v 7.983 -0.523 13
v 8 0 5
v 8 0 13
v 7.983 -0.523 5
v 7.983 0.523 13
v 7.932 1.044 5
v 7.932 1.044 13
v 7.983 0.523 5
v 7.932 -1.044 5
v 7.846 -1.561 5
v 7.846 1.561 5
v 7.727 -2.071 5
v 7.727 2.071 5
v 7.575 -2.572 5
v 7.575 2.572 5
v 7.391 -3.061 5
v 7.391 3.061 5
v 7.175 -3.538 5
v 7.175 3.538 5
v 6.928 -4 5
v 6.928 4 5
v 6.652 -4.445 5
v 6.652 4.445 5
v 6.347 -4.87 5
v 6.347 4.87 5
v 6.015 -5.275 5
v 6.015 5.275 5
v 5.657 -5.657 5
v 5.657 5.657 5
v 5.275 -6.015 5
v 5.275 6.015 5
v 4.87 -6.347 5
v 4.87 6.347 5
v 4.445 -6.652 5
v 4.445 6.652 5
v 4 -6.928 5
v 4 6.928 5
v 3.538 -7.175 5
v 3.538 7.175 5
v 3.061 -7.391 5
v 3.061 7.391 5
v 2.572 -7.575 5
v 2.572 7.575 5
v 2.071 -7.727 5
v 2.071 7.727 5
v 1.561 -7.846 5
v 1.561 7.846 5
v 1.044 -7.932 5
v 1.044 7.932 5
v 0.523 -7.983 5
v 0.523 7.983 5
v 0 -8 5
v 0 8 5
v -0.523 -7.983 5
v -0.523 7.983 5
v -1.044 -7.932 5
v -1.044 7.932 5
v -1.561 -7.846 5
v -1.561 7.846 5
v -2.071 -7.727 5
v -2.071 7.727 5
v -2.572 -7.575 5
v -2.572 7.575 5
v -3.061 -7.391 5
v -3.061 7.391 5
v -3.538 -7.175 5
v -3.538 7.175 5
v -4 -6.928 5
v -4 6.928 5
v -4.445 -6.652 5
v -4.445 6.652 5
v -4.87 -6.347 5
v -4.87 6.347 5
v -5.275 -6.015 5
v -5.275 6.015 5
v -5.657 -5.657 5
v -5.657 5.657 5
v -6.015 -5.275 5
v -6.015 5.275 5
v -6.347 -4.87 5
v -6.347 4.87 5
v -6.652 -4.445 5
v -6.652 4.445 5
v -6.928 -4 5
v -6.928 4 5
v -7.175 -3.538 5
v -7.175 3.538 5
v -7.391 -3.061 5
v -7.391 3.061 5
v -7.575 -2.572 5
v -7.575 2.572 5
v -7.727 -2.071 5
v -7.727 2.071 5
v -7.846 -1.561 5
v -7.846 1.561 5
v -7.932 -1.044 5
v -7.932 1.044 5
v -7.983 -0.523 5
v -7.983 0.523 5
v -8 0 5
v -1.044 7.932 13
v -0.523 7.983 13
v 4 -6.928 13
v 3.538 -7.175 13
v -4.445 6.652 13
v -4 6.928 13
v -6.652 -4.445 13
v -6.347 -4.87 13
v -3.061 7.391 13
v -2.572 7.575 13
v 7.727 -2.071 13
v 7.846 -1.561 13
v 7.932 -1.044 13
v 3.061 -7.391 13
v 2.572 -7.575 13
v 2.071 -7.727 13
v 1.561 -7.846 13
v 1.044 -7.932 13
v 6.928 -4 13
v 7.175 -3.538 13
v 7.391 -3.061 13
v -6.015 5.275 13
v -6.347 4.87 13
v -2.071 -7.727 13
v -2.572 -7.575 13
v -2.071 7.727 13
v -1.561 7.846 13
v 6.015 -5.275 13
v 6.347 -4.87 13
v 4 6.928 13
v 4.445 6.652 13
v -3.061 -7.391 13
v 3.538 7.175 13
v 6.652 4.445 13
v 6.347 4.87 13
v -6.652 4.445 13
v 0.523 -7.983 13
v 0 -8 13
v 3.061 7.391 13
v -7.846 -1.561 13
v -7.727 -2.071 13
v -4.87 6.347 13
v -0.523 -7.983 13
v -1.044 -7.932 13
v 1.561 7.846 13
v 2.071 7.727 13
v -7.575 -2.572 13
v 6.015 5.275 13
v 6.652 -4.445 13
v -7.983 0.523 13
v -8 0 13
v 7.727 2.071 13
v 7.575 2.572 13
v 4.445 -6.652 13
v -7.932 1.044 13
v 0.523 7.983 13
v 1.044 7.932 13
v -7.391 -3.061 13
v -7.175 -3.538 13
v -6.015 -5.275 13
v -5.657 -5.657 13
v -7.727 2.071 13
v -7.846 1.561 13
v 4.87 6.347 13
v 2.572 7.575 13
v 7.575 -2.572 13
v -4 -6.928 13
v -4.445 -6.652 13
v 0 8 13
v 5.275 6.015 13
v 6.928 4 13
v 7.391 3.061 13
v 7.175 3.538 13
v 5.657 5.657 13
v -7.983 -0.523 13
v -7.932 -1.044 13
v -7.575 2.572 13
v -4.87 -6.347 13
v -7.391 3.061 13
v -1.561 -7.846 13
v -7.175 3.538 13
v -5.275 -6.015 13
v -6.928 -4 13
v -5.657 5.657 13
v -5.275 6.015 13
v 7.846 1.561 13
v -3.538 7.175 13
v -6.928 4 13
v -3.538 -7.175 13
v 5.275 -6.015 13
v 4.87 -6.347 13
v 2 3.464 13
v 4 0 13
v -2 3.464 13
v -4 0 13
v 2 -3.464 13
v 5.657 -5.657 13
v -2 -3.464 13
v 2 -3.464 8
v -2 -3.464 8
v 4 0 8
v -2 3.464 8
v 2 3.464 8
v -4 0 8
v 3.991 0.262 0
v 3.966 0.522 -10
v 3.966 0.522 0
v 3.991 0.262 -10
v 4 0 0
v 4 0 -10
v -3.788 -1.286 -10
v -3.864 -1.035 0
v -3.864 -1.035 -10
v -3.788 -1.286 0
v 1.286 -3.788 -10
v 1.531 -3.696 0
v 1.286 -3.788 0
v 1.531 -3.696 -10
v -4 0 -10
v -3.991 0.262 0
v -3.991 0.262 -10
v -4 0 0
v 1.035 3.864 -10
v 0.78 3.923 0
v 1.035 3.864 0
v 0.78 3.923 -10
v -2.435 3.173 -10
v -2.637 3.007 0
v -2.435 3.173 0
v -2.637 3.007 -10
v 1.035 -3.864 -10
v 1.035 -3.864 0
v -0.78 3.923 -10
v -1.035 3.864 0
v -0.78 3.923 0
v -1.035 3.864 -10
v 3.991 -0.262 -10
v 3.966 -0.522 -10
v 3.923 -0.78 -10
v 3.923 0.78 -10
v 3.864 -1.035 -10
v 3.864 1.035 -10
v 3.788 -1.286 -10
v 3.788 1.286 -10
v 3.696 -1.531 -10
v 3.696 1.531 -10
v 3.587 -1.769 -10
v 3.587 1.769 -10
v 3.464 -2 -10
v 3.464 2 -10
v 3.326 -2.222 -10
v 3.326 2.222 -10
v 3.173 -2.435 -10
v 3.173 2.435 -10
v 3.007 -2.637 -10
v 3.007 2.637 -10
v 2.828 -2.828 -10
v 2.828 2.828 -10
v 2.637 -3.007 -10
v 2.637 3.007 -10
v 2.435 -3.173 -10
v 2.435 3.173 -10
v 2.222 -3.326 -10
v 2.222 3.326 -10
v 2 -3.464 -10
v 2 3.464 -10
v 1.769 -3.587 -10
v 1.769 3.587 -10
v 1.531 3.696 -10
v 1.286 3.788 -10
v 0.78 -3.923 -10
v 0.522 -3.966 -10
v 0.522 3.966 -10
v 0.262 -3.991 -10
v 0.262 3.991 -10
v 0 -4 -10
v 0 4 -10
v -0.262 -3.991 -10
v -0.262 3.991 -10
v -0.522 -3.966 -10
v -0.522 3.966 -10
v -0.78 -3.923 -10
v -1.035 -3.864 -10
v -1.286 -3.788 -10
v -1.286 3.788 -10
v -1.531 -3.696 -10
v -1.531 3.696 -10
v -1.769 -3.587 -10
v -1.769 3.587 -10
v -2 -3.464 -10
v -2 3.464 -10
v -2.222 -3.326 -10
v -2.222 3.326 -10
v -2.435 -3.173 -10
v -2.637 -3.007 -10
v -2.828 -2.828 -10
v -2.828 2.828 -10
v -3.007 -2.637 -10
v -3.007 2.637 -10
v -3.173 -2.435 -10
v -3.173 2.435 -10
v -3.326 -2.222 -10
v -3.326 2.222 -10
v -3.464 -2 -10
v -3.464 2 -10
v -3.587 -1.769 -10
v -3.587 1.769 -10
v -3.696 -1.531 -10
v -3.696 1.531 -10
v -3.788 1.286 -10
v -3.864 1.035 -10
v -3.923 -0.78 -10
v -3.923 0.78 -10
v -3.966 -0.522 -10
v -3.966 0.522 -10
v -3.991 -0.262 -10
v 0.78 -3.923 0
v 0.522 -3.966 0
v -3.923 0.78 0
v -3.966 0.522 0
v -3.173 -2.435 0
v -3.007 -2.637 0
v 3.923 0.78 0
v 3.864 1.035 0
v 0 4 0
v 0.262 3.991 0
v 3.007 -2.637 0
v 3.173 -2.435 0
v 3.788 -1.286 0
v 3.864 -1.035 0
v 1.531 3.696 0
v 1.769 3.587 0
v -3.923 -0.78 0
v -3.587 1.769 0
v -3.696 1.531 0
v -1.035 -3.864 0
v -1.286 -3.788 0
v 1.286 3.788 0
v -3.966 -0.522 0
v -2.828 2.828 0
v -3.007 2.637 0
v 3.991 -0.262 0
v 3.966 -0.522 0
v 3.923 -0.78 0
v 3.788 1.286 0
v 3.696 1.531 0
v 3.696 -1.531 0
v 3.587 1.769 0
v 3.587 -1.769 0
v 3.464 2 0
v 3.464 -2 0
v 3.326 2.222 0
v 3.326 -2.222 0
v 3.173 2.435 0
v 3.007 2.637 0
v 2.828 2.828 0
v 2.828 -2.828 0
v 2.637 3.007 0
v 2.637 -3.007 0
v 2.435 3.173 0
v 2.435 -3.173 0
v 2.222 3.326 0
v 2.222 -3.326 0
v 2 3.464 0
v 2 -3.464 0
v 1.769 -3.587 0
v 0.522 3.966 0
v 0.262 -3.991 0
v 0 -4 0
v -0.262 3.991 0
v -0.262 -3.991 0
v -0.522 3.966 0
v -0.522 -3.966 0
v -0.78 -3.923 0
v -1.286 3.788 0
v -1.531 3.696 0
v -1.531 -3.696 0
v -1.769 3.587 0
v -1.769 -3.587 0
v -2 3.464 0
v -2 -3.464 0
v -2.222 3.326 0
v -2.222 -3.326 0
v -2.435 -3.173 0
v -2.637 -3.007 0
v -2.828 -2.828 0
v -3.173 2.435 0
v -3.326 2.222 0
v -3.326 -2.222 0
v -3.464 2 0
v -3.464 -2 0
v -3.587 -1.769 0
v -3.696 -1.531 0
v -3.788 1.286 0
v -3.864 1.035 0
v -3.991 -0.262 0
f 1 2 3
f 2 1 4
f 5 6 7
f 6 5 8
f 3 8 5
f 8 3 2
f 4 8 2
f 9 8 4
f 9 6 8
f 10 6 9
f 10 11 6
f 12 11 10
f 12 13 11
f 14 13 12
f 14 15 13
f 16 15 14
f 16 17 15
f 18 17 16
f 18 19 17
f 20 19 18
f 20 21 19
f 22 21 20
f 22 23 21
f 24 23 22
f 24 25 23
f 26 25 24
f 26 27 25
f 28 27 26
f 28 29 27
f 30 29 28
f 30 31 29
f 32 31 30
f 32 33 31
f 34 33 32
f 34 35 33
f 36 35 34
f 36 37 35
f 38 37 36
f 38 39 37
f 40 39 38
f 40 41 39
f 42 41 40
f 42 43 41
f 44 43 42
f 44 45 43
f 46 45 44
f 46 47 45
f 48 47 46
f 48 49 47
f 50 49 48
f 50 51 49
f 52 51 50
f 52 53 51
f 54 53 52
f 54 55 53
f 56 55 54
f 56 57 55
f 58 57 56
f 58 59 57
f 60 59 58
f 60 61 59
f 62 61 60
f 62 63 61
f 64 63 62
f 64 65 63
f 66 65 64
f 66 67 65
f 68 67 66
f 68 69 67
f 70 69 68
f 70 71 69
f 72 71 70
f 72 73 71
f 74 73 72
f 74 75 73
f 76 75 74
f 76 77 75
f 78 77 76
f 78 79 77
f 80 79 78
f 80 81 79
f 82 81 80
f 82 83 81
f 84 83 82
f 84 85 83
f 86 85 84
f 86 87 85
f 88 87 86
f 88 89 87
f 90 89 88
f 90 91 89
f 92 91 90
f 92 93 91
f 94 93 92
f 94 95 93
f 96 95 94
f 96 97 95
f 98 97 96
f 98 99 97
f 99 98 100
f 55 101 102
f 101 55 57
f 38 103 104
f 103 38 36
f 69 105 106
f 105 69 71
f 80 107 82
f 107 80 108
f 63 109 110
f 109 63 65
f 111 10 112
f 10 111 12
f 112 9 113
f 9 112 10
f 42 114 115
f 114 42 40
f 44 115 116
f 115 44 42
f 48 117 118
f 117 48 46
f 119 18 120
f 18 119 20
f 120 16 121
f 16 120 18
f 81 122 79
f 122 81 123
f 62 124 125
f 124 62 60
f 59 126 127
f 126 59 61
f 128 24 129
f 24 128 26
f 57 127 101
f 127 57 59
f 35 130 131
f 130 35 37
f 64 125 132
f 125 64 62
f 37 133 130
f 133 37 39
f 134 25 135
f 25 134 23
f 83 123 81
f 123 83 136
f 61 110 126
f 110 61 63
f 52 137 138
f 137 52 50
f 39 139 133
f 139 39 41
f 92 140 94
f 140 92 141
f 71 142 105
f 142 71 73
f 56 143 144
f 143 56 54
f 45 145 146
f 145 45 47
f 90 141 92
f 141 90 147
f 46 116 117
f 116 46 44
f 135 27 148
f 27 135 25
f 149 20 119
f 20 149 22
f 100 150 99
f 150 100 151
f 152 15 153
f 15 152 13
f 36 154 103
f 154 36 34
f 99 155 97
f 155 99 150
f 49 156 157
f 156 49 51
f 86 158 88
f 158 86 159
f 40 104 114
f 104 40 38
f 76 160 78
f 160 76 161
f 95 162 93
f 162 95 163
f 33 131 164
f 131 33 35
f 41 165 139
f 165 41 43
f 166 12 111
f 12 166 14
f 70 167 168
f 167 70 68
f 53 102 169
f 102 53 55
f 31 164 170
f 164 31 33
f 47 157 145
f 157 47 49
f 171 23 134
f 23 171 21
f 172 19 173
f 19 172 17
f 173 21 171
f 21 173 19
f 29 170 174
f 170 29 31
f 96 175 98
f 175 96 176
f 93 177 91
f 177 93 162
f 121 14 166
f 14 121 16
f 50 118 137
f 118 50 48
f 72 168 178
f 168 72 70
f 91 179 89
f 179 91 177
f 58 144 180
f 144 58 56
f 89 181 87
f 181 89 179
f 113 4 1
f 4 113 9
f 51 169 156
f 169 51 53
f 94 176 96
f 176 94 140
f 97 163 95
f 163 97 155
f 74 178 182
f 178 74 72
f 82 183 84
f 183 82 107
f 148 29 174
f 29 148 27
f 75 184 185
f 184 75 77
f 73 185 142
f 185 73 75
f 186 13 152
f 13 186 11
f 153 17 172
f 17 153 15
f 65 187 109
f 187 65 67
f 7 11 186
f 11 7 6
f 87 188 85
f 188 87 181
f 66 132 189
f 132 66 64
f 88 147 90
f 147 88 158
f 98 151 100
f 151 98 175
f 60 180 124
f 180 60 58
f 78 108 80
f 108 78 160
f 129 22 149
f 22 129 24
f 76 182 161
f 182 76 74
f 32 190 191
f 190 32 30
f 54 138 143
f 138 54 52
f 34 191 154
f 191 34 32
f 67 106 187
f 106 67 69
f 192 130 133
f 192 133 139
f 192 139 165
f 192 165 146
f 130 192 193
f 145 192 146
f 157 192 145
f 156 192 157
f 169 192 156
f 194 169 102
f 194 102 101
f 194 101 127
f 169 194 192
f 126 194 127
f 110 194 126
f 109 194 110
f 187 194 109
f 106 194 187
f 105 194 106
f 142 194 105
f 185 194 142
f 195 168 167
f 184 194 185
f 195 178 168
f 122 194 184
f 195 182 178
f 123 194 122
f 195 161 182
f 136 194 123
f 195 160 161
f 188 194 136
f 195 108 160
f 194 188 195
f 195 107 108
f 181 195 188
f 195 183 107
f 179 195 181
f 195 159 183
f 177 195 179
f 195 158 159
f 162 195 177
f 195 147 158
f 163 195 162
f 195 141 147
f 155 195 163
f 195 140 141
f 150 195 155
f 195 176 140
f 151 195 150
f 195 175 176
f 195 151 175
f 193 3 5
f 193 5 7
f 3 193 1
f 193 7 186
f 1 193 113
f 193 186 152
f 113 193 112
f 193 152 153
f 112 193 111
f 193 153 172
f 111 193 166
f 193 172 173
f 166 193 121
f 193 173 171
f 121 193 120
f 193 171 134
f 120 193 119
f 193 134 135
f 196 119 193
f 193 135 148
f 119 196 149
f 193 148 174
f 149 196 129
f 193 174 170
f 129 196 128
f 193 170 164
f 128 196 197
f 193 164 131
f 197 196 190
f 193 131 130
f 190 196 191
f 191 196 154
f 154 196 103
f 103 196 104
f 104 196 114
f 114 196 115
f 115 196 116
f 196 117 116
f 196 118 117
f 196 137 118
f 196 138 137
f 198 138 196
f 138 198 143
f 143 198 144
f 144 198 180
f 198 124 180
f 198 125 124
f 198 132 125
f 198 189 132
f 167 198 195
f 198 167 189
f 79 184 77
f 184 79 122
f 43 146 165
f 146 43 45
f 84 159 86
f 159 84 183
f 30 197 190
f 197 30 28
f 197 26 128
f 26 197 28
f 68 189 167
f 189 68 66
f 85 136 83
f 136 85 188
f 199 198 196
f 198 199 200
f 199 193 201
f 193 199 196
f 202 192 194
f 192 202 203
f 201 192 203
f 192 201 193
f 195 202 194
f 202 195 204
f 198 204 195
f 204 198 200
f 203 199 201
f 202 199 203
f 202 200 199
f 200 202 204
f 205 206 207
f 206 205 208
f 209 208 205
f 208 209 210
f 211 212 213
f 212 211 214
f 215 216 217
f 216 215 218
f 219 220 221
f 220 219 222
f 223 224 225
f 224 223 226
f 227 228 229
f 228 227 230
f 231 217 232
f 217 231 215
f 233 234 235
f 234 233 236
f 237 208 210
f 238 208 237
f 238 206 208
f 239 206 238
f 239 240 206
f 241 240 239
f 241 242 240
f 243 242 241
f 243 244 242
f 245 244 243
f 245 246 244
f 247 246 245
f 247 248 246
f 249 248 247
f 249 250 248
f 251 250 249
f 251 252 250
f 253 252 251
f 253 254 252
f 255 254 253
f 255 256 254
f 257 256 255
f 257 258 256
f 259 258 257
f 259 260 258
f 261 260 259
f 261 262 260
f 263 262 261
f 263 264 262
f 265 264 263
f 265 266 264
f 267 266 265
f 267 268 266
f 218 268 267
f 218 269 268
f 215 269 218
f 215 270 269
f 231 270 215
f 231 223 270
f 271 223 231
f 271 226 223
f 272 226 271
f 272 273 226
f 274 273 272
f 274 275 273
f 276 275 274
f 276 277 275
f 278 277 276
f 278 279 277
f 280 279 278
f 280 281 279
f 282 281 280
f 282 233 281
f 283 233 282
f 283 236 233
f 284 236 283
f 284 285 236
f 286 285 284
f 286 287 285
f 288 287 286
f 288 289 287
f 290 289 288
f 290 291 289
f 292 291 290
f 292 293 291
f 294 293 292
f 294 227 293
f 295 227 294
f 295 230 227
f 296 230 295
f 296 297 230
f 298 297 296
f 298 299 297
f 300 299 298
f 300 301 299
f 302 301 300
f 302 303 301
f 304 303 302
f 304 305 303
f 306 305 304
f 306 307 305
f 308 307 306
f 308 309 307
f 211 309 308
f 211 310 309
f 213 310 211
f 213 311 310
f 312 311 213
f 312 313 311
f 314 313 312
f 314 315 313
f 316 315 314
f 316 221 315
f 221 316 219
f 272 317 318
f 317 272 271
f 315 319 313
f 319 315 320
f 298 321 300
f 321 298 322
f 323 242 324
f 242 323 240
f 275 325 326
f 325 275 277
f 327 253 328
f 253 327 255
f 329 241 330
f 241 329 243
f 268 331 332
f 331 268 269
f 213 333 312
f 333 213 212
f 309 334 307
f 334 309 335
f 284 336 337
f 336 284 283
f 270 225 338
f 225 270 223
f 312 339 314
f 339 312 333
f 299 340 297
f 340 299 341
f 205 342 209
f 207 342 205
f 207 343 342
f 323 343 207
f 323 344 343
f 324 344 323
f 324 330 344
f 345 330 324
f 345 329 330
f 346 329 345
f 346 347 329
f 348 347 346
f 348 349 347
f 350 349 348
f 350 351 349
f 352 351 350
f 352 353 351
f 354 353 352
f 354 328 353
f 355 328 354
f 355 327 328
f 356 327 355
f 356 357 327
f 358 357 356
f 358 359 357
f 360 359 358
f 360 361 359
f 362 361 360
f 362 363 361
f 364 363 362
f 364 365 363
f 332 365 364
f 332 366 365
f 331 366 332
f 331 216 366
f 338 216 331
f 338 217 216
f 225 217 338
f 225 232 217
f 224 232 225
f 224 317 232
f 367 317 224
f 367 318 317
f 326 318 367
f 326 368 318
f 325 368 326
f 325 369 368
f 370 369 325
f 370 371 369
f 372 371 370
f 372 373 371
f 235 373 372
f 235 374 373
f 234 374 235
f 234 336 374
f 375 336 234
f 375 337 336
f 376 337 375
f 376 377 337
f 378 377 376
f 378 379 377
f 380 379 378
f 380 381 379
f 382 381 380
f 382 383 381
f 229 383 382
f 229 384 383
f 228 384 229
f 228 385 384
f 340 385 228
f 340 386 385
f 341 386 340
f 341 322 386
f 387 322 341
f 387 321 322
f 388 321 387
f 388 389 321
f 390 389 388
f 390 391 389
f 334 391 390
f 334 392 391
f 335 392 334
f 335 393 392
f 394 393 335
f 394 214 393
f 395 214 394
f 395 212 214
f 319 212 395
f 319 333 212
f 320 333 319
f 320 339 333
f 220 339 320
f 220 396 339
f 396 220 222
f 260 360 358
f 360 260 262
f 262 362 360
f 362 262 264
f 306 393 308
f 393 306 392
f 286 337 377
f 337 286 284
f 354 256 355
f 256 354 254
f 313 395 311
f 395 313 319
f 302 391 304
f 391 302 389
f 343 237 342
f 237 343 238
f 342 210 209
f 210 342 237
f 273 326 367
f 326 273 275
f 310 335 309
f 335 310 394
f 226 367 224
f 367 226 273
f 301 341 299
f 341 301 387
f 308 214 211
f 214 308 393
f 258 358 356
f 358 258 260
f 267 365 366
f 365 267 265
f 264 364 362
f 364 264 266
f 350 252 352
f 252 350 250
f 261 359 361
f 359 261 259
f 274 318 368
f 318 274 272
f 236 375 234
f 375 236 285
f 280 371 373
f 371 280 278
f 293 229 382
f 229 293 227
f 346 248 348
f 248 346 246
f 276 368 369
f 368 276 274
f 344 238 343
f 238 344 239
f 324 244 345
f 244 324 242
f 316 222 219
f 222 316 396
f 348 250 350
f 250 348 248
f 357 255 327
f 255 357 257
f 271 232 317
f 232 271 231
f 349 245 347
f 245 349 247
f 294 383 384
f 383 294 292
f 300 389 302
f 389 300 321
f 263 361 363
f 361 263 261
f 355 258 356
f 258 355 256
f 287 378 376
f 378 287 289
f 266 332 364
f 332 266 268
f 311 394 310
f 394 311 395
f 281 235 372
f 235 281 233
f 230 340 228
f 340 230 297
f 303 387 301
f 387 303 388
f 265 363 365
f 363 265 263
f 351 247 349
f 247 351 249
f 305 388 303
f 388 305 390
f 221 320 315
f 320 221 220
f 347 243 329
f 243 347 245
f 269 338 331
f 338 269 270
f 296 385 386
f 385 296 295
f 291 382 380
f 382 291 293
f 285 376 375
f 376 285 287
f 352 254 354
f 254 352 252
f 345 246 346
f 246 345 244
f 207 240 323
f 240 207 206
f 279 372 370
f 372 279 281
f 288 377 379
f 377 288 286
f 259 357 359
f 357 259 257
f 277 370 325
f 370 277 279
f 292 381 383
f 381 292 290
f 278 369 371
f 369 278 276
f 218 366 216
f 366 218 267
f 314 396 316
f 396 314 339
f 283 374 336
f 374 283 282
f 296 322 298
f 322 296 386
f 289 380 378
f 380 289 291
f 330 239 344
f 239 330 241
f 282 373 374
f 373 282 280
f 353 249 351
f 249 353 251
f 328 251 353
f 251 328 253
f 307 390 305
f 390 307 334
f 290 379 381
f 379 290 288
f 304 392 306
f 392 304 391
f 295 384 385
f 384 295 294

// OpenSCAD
$fn=96;

module socket_head_cap_screw(d=8.0, head_d=16.0, length=10.0, head_h=8.0, socket_d=8.0, socket_depth=5.0, chamfer=0.6) {
    union() {
        // Shank
        translate([0,0,-length/2])
            cylinder(d=d, h=length, center=true);

        // Head
        translate([0,0,length/2 + head_h/2])
        difference() {
            union() {
                cylinder(d=head_d, h=head_h, center=true);
                // Top chamfer
                translate([0,0,head_h/2 - chamfer/2])
                    cylinder(d1=head_d, d2=head_d - 2*chamfer, h=chamfer, center=true);
                // Bottom chamfer
                translate([0,0,-head_h/2 + chamfer/2])
                    cylinder(d1=head_d - 2*chamfer, d2=head_d, h=chamfer, center=true);
            }
            // Hex socket (approximated by 6-sided prism)
            translate([0,0,head_h/2 - socket_depth/2])
                cylinder(d=socket_d, h=socket_depth, center=true, $fn=6);
        }
    }
}

socket_head_cap_screw(d=8.0, head_d=16.0, length=10.0, head_h=8.0, socket_d=8.0, socket_depth=5.0, chamfer=0.6);
